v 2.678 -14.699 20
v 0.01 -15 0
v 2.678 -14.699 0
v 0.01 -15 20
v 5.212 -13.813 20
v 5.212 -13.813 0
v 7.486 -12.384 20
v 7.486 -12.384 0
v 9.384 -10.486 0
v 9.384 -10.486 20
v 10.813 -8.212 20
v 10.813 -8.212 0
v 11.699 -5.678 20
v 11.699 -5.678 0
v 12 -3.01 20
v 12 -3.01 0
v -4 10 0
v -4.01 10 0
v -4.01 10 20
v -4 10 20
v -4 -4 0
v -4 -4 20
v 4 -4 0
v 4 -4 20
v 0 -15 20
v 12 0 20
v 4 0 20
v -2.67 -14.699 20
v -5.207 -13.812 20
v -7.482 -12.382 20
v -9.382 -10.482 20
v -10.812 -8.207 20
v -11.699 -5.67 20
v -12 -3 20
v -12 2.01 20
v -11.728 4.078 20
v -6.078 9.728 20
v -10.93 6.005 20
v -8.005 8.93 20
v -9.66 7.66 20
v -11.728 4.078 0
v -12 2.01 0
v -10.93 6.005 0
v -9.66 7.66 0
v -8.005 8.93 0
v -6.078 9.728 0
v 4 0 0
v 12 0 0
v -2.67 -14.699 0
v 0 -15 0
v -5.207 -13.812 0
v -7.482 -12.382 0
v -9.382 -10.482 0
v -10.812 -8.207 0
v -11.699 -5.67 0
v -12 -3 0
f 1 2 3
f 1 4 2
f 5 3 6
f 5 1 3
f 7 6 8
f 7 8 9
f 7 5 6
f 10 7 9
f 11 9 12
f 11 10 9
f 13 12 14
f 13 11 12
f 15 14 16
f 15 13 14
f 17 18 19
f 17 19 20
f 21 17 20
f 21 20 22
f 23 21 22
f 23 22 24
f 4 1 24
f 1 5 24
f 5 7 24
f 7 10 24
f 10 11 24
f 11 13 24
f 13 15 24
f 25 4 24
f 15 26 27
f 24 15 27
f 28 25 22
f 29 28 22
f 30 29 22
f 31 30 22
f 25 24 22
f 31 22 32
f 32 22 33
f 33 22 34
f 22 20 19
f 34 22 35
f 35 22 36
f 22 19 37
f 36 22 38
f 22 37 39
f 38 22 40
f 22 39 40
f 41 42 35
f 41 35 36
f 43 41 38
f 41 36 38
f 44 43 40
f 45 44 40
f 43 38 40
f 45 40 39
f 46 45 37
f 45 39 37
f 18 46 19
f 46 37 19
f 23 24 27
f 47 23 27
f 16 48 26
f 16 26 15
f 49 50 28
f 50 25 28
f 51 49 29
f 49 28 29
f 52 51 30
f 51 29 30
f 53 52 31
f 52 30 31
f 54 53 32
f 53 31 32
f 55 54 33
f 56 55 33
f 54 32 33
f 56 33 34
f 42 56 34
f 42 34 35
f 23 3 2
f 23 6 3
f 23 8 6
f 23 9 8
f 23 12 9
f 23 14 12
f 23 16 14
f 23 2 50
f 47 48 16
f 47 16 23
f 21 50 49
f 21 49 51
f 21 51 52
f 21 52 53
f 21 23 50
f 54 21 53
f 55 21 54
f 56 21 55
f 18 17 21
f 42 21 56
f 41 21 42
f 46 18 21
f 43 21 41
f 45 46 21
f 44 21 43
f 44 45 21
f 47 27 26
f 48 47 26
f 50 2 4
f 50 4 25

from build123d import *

# Parameters (mm, degrees)
PAD_DEPTH   = 20
FILLET_R    = 12
FILLET001_R = 11.99
FILLET002_R = 7.99


with BuildPart() as part:
    # Sketch → Pad (new body)
    with BuildSketch(Plane.XY):
        Polygon((-12, 10), (-4, 10), (-4, -4), (4, -4), (4, 0), (12, 0), (12, -15), (-12, -15), align=None)
    extrude(amount=PAD_DEPTH)

    # Fillet
    fillet_edges = [part.edges().sort_by_distance(p)[0] for p in [
        (-12, -15, 10),
    ]]
    fillet(fillet_edges, radius=FILLET_R)

    # Fillet001
    fillet001_edges = [part.edges().sort_by_distance(p)[0] for p in [
        (12, -15, 10),
    ]]
    fillet(fillet001_edges, radius=FILLET001_R)

    # Fillet002
    fillet002_edges = [part.edges().sort_by_distance(p)[0] for p in [
        (-12, 10, 10),
    ]]
    fillet(fillet002_edges, radius=FILLET002_R)


solid = part.part
